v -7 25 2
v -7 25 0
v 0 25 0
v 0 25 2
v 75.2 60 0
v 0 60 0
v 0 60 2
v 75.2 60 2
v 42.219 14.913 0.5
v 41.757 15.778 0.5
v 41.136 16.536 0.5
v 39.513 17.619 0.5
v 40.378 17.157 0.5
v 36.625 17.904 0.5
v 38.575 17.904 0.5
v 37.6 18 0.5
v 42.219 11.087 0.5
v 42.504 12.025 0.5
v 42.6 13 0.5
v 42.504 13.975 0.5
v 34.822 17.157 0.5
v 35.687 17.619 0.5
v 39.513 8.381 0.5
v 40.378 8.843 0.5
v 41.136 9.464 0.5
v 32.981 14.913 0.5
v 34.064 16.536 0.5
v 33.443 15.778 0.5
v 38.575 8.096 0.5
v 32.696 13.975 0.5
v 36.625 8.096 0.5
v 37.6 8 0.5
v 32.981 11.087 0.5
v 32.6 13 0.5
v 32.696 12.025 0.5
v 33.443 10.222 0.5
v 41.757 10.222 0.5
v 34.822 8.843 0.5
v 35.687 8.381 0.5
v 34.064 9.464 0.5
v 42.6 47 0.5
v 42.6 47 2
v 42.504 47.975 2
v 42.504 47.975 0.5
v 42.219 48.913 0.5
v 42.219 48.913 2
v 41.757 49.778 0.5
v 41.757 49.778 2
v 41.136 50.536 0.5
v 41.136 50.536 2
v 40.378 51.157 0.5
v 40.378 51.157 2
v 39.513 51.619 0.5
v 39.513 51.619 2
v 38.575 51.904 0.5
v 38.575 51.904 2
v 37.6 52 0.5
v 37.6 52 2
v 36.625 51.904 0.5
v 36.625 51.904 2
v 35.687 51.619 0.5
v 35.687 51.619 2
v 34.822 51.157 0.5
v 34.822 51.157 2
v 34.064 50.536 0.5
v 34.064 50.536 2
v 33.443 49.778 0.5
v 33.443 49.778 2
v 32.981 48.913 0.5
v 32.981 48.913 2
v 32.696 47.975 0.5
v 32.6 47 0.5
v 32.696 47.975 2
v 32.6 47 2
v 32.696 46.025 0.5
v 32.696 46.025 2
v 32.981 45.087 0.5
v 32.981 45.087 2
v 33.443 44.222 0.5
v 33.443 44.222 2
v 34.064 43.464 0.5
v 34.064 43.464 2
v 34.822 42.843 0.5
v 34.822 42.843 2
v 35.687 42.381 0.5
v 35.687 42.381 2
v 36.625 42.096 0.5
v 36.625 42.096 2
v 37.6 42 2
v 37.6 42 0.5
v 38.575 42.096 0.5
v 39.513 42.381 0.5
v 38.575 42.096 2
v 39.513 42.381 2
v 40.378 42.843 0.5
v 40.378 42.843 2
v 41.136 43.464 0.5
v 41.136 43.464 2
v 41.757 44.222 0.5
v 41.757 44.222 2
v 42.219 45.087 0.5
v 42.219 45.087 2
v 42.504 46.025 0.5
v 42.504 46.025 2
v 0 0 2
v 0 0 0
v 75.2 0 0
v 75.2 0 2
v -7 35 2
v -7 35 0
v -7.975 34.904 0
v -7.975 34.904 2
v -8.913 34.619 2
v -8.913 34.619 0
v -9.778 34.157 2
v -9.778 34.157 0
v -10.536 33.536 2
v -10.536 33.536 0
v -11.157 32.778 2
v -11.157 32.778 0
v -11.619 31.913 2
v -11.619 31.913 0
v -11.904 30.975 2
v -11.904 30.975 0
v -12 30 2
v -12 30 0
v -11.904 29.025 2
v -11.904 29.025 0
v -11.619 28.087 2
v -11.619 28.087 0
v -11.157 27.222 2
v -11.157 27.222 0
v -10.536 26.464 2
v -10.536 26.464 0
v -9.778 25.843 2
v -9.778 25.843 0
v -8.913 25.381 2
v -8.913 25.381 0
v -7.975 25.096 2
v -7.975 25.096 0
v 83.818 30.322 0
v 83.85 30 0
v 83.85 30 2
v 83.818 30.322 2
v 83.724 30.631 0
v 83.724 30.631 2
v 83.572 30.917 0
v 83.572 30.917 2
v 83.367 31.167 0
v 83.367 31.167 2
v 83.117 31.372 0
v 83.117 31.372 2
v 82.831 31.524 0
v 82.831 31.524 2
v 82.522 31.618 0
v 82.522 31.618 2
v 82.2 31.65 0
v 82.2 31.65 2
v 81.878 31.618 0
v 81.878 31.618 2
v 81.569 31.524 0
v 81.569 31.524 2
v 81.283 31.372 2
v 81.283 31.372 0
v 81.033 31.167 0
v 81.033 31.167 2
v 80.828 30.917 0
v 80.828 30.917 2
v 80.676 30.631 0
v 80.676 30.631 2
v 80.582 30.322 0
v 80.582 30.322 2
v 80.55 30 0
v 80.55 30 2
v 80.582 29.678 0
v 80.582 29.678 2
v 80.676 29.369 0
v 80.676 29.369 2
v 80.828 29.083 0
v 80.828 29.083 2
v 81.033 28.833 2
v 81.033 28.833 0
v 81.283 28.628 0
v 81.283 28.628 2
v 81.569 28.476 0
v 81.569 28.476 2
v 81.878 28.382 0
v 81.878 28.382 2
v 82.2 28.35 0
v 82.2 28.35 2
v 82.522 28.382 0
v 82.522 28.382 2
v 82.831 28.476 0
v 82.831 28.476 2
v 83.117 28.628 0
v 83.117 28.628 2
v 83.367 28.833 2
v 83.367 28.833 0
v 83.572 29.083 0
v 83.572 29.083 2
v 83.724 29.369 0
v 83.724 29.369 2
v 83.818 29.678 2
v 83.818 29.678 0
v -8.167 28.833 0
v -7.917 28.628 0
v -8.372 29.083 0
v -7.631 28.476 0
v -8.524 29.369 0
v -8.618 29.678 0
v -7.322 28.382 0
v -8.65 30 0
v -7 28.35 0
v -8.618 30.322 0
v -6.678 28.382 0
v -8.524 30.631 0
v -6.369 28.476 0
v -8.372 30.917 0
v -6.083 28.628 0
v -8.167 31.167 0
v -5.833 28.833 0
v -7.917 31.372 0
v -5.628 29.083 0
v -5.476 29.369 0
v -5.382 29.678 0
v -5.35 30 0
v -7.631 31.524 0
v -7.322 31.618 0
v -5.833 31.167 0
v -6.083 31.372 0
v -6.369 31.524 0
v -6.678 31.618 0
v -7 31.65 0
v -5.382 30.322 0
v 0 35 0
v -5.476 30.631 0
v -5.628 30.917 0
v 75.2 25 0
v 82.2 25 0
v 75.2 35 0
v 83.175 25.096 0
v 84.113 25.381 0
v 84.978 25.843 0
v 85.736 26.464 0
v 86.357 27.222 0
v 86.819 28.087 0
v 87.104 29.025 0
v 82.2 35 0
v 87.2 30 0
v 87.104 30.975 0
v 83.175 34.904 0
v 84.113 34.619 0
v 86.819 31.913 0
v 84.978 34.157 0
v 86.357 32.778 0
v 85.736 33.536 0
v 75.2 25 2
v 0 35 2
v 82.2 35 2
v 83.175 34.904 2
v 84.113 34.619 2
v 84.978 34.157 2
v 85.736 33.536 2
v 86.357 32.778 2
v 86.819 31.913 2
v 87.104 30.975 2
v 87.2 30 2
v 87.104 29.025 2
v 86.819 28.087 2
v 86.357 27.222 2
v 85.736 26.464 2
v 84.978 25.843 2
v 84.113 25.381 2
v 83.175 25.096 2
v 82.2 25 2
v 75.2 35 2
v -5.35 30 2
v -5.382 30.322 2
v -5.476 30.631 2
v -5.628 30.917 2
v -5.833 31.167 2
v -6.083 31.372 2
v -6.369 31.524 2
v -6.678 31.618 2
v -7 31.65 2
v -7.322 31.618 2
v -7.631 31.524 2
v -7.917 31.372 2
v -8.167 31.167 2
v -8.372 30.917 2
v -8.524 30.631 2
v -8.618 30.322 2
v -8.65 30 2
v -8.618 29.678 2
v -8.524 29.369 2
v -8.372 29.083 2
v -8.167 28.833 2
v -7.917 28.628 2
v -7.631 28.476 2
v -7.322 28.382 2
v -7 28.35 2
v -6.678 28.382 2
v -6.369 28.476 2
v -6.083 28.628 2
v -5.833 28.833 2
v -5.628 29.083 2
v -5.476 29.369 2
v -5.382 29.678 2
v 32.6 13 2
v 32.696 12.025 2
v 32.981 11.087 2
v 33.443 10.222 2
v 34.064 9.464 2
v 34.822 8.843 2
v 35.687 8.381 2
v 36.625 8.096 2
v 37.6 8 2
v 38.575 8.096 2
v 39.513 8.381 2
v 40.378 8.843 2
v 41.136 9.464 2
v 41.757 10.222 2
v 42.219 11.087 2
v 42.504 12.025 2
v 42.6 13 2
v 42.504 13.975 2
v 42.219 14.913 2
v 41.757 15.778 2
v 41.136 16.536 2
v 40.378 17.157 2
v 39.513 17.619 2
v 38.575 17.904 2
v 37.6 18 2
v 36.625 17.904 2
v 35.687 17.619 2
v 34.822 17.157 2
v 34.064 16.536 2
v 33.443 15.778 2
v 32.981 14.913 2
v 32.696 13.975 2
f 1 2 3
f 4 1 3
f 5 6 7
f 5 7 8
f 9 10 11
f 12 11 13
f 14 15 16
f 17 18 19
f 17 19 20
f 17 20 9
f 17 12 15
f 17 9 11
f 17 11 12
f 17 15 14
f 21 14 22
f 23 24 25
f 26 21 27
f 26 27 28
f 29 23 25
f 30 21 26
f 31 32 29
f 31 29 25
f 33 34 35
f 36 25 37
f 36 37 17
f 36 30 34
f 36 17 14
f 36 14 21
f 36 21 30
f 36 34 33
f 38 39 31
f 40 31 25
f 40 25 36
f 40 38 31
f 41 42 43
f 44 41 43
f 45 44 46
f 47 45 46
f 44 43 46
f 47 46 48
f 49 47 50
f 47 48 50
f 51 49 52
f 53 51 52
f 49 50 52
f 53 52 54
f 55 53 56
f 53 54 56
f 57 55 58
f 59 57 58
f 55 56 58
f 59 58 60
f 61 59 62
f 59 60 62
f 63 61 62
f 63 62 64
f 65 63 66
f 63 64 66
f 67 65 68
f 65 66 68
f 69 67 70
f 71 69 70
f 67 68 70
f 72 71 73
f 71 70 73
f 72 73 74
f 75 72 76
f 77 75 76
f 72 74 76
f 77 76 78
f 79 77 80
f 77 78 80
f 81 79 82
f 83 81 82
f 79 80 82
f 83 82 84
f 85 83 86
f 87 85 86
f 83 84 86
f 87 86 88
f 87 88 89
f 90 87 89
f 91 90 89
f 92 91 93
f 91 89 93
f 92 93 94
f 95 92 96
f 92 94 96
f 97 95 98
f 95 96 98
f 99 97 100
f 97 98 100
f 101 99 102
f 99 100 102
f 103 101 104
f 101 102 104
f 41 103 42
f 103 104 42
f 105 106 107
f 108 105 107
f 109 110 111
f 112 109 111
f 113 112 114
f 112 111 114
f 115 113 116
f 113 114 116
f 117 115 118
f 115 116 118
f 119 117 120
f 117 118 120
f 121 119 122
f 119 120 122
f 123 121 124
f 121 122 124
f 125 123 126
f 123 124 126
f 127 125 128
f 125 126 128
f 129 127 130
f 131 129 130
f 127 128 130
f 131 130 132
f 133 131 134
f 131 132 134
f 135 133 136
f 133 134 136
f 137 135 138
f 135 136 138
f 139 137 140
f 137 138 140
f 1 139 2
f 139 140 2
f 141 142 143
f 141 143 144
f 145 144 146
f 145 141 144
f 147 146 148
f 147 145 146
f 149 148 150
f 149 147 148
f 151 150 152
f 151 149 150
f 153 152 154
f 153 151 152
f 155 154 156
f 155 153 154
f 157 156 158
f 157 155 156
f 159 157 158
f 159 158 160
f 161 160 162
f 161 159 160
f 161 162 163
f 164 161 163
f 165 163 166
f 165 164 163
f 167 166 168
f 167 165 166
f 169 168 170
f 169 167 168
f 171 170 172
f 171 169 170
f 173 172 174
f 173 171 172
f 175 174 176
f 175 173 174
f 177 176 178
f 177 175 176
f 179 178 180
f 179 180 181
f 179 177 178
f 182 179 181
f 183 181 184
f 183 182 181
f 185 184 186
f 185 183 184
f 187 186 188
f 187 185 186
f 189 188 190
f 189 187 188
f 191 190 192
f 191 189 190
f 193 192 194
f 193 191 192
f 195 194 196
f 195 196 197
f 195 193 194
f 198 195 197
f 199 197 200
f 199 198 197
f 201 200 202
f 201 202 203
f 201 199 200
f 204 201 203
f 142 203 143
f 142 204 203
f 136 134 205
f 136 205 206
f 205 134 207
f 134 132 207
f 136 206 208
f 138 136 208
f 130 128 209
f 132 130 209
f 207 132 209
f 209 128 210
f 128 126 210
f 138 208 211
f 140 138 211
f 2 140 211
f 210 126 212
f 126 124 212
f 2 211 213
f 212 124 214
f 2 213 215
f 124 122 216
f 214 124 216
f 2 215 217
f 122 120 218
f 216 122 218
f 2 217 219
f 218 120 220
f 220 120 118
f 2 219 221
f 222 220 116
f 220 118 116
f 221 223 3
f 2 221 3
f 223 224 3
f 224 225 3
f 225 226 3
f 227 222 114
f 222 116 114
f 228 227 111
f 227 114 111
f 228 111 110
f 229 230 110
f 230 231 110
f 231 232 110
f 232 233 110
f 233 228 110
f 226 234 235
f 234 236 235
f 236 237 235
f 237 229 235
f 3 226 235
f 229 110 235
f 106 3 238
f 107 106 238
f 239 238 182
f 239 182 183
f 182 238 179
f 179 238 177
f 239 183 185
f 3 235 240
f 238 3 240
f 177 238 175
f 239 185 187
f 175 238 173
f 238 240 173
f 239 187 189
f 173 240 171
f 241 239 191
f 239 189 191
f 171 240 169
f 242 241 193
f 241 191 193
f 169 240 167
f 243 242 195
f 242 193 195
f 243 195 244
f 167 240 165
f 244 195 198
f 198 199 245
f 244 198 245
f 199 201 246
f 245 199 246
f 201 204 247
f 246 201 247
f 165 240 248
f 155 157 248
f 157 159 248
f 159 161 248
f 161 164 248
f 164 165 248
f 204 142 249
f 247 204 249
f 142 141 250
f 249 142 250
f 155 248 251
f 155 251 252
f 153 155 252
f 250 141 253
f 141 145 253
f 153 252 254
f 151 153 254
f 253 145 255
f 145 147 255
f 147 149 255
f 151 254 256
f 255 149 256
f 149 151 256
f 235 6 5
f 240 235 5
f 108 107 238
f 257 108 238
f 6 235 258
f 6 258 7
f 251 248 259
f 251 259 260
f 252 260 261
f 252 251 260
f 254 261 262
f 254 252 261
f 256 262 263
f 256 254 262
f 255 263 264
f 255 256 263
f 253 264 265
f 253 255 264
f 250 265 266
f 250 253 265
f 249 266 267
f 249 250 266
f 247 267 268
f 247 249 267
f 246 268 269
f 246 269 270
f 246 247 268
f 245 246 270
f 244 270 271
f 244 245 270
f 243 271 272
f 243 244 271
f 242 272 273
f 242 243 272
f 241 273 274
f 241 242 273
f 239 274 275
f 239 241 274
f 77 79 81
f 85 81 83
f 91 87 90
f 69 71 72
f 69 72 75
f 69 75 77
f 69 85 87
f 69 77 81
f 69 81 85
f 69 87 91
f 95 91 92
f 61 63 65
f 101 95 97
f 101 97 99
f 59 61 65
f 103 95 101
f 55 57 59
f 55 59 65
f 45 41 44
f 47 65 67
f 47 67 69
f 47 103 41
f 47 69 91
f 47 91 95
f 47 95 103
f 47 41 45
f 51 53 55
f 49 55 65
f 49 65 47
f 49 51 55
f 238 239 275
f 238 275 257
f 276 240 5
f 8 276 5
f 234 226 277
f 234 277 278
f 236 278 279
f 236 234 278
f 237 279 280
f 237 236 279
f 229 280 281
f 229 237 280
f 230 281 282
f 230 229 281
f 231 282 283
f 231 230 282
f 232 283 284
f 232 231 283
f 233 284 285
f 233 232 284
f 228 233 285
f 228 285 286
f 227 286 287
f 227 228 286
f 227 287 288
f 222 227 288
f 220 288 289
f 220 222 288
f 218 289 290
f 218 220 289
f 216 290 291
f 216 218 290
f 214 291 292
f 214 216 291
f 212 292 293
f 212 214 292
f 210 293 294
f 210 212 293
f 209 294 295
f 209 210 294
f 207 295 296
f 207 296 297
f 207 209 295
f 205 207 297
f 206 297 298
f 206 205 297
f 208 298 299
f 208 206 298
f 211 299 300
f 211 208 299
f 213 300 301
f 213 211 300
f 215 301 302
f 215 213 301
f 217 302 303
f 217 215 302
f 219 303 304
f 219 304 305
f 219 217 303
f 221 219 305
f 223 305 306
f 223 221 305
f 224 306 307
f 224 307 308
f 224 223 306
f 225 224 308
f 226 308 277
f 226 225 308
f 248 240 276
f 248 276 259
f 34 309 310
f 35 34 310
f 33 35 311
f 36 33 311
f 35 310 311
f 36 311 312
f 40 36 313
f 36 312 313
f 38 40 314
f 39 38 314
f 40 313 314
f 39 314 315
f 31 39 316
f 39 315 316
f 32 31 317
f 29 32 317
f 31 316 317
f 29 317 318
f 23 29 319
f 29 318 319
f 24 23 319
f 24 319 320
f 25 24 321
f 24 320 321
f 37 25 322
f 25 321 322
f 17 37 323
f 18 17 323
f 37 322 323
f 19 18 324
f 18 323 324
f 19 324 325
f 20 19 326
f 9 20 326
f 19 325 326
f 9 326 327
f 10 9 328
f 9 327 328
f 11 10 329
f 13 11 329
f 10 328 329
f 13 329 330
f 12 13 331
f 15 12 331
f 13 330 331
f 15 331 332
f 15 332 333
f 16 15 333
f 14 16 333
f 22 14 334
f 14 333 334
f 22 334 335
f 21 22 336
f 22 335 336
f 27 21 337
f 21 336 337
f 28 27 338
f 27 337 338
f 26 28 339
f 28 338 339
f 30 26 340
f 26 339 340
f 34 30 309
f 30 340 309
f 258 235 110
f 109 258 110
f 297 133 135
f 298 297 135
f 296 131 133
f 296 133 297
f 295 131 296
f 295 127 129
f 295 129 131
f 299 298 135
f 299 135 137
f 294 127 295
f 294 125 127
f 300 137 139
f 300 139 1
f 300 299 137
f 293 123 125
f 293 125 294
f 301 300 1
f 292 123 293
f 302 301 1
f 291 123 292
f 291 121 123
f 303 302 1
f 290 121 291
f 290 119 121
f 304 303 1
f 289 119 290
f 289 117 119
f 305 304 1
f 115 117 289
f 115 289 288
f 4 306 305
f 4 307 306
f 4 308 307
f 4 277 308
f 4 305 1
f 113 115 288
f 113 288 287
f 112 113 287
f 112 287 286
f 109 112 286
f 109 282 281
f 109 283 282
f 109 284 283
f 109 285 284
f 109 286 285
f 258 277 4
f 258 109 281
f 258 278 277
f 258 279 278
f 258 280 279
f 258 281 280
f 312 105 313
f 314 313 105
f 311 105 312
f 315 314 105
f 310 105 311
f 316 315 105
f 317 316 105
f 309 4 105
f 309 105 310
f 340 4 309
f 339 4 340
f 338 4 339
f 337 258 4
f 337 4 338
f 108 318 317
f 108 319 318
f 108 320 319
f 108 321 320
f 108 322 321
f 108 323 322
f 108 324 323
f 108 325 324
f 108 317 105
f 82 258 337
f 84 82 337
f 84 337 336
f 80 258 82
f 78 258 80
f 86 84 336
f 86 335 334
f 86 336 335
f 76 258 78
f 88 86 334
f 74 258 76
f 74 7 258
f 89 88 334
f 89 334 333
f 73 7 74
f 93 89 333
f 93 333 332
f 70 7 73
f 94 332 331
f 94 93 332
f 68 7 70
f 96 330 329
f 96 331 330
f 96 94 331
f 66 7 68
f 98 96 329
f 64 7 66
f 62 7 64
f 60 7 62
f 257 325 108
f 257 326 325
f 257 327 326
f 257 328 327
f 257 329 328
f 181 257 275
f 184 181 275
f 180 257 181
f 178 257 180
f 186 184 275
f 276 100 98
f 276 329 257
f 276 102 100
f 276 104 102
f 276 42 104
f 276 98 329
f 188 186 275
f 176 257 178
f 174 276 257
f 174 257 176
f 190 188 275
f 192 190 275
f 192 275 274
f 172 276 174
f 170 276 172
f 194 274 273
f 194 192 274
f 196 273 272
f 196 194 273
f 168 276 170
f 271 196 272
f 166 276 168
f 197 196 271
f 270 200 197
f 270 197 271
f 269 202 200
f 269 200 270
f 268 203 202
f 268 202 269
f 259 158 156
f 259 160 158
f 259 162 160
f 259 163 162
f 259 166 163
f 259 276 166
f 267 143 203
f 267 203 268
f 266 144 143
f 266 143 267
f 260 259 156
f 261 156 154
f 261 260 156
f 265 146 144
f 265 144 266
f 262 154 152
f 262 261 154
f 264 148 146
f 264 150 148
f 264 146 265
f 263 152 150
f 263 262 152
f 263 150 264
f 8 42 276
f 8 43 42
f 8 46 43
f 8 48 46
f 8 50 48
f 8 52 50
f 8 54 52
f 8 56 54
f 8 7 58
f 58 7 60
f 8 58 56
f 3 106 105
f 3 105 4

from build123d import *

# Parameters (mm, degrees)
SKETCH2_W           = 75.2
SKETCH2_H           = 60
SKETCH2_R           = 1.65
BOSS_EXTRUDE1_DEPTH = 2
SKETCH3_R           = 5
CUT_EXTRUDE1_DEPTH  = 1.5


with BuildPart() as part:
    # Sketch2 → Boss-Extrude1 (new body)
    # profile 1 of 3: a face of its own
    with BuildSketch(Plane.XY):
        with Locations((37.6, 30)):
            Rectangle(SKETCH2_W, SKETCH2_H)
    # profile 2 of 3: a face of its own
    with BuildSketch(Plane.XY):
        with BuildLine():
            Line((0, 35), (-7, 35))
            ThreePointArc((-7, 35), (-12, 30), (-7, 25))
            Line((-7, 25), (0, 25))
            Line((0, 25), (0, 35))
        make_face()
        with Locations((-7, 30)):
            Circle(SKETCH2_R, mode=Mode.SUBTRACT)
    # profile 3 of 3: a face of its own
    with BuildSketch(Plane.XY):
        with BuildLine():
            Line((82.2, 25), (75.2, 25))
            Line((75.2, 25), (75.2, 35))
            Line((75.2, 35), (82.2, 35))
            ThreePointArc((82.2, 35), (87.2, 30), (82.2, 25))
        make_face()
        with Locations((82.2, 30)):
            Circle(SKETCH2_R, mode=Mode.SUBTRACT)
    extrude(amount=BOSS_EXTRUDE1_DEPTH)

    # Sketch3 → Cut-Extrude1 (cut)
    with BuildSketch(Plane.XY.offset(2)):
        with Locations((37.6, 47)):
            Circle(SKETCH3_R)
        with Locations(Location((37.6, 13, 0), (0, 0, 180))):
            Circle(SKETCH3_R)
    extrude(amount=-CUT_EXTRUDE1_DEPTH, mode=Mode.SUBTRACT)


solid = part.part
